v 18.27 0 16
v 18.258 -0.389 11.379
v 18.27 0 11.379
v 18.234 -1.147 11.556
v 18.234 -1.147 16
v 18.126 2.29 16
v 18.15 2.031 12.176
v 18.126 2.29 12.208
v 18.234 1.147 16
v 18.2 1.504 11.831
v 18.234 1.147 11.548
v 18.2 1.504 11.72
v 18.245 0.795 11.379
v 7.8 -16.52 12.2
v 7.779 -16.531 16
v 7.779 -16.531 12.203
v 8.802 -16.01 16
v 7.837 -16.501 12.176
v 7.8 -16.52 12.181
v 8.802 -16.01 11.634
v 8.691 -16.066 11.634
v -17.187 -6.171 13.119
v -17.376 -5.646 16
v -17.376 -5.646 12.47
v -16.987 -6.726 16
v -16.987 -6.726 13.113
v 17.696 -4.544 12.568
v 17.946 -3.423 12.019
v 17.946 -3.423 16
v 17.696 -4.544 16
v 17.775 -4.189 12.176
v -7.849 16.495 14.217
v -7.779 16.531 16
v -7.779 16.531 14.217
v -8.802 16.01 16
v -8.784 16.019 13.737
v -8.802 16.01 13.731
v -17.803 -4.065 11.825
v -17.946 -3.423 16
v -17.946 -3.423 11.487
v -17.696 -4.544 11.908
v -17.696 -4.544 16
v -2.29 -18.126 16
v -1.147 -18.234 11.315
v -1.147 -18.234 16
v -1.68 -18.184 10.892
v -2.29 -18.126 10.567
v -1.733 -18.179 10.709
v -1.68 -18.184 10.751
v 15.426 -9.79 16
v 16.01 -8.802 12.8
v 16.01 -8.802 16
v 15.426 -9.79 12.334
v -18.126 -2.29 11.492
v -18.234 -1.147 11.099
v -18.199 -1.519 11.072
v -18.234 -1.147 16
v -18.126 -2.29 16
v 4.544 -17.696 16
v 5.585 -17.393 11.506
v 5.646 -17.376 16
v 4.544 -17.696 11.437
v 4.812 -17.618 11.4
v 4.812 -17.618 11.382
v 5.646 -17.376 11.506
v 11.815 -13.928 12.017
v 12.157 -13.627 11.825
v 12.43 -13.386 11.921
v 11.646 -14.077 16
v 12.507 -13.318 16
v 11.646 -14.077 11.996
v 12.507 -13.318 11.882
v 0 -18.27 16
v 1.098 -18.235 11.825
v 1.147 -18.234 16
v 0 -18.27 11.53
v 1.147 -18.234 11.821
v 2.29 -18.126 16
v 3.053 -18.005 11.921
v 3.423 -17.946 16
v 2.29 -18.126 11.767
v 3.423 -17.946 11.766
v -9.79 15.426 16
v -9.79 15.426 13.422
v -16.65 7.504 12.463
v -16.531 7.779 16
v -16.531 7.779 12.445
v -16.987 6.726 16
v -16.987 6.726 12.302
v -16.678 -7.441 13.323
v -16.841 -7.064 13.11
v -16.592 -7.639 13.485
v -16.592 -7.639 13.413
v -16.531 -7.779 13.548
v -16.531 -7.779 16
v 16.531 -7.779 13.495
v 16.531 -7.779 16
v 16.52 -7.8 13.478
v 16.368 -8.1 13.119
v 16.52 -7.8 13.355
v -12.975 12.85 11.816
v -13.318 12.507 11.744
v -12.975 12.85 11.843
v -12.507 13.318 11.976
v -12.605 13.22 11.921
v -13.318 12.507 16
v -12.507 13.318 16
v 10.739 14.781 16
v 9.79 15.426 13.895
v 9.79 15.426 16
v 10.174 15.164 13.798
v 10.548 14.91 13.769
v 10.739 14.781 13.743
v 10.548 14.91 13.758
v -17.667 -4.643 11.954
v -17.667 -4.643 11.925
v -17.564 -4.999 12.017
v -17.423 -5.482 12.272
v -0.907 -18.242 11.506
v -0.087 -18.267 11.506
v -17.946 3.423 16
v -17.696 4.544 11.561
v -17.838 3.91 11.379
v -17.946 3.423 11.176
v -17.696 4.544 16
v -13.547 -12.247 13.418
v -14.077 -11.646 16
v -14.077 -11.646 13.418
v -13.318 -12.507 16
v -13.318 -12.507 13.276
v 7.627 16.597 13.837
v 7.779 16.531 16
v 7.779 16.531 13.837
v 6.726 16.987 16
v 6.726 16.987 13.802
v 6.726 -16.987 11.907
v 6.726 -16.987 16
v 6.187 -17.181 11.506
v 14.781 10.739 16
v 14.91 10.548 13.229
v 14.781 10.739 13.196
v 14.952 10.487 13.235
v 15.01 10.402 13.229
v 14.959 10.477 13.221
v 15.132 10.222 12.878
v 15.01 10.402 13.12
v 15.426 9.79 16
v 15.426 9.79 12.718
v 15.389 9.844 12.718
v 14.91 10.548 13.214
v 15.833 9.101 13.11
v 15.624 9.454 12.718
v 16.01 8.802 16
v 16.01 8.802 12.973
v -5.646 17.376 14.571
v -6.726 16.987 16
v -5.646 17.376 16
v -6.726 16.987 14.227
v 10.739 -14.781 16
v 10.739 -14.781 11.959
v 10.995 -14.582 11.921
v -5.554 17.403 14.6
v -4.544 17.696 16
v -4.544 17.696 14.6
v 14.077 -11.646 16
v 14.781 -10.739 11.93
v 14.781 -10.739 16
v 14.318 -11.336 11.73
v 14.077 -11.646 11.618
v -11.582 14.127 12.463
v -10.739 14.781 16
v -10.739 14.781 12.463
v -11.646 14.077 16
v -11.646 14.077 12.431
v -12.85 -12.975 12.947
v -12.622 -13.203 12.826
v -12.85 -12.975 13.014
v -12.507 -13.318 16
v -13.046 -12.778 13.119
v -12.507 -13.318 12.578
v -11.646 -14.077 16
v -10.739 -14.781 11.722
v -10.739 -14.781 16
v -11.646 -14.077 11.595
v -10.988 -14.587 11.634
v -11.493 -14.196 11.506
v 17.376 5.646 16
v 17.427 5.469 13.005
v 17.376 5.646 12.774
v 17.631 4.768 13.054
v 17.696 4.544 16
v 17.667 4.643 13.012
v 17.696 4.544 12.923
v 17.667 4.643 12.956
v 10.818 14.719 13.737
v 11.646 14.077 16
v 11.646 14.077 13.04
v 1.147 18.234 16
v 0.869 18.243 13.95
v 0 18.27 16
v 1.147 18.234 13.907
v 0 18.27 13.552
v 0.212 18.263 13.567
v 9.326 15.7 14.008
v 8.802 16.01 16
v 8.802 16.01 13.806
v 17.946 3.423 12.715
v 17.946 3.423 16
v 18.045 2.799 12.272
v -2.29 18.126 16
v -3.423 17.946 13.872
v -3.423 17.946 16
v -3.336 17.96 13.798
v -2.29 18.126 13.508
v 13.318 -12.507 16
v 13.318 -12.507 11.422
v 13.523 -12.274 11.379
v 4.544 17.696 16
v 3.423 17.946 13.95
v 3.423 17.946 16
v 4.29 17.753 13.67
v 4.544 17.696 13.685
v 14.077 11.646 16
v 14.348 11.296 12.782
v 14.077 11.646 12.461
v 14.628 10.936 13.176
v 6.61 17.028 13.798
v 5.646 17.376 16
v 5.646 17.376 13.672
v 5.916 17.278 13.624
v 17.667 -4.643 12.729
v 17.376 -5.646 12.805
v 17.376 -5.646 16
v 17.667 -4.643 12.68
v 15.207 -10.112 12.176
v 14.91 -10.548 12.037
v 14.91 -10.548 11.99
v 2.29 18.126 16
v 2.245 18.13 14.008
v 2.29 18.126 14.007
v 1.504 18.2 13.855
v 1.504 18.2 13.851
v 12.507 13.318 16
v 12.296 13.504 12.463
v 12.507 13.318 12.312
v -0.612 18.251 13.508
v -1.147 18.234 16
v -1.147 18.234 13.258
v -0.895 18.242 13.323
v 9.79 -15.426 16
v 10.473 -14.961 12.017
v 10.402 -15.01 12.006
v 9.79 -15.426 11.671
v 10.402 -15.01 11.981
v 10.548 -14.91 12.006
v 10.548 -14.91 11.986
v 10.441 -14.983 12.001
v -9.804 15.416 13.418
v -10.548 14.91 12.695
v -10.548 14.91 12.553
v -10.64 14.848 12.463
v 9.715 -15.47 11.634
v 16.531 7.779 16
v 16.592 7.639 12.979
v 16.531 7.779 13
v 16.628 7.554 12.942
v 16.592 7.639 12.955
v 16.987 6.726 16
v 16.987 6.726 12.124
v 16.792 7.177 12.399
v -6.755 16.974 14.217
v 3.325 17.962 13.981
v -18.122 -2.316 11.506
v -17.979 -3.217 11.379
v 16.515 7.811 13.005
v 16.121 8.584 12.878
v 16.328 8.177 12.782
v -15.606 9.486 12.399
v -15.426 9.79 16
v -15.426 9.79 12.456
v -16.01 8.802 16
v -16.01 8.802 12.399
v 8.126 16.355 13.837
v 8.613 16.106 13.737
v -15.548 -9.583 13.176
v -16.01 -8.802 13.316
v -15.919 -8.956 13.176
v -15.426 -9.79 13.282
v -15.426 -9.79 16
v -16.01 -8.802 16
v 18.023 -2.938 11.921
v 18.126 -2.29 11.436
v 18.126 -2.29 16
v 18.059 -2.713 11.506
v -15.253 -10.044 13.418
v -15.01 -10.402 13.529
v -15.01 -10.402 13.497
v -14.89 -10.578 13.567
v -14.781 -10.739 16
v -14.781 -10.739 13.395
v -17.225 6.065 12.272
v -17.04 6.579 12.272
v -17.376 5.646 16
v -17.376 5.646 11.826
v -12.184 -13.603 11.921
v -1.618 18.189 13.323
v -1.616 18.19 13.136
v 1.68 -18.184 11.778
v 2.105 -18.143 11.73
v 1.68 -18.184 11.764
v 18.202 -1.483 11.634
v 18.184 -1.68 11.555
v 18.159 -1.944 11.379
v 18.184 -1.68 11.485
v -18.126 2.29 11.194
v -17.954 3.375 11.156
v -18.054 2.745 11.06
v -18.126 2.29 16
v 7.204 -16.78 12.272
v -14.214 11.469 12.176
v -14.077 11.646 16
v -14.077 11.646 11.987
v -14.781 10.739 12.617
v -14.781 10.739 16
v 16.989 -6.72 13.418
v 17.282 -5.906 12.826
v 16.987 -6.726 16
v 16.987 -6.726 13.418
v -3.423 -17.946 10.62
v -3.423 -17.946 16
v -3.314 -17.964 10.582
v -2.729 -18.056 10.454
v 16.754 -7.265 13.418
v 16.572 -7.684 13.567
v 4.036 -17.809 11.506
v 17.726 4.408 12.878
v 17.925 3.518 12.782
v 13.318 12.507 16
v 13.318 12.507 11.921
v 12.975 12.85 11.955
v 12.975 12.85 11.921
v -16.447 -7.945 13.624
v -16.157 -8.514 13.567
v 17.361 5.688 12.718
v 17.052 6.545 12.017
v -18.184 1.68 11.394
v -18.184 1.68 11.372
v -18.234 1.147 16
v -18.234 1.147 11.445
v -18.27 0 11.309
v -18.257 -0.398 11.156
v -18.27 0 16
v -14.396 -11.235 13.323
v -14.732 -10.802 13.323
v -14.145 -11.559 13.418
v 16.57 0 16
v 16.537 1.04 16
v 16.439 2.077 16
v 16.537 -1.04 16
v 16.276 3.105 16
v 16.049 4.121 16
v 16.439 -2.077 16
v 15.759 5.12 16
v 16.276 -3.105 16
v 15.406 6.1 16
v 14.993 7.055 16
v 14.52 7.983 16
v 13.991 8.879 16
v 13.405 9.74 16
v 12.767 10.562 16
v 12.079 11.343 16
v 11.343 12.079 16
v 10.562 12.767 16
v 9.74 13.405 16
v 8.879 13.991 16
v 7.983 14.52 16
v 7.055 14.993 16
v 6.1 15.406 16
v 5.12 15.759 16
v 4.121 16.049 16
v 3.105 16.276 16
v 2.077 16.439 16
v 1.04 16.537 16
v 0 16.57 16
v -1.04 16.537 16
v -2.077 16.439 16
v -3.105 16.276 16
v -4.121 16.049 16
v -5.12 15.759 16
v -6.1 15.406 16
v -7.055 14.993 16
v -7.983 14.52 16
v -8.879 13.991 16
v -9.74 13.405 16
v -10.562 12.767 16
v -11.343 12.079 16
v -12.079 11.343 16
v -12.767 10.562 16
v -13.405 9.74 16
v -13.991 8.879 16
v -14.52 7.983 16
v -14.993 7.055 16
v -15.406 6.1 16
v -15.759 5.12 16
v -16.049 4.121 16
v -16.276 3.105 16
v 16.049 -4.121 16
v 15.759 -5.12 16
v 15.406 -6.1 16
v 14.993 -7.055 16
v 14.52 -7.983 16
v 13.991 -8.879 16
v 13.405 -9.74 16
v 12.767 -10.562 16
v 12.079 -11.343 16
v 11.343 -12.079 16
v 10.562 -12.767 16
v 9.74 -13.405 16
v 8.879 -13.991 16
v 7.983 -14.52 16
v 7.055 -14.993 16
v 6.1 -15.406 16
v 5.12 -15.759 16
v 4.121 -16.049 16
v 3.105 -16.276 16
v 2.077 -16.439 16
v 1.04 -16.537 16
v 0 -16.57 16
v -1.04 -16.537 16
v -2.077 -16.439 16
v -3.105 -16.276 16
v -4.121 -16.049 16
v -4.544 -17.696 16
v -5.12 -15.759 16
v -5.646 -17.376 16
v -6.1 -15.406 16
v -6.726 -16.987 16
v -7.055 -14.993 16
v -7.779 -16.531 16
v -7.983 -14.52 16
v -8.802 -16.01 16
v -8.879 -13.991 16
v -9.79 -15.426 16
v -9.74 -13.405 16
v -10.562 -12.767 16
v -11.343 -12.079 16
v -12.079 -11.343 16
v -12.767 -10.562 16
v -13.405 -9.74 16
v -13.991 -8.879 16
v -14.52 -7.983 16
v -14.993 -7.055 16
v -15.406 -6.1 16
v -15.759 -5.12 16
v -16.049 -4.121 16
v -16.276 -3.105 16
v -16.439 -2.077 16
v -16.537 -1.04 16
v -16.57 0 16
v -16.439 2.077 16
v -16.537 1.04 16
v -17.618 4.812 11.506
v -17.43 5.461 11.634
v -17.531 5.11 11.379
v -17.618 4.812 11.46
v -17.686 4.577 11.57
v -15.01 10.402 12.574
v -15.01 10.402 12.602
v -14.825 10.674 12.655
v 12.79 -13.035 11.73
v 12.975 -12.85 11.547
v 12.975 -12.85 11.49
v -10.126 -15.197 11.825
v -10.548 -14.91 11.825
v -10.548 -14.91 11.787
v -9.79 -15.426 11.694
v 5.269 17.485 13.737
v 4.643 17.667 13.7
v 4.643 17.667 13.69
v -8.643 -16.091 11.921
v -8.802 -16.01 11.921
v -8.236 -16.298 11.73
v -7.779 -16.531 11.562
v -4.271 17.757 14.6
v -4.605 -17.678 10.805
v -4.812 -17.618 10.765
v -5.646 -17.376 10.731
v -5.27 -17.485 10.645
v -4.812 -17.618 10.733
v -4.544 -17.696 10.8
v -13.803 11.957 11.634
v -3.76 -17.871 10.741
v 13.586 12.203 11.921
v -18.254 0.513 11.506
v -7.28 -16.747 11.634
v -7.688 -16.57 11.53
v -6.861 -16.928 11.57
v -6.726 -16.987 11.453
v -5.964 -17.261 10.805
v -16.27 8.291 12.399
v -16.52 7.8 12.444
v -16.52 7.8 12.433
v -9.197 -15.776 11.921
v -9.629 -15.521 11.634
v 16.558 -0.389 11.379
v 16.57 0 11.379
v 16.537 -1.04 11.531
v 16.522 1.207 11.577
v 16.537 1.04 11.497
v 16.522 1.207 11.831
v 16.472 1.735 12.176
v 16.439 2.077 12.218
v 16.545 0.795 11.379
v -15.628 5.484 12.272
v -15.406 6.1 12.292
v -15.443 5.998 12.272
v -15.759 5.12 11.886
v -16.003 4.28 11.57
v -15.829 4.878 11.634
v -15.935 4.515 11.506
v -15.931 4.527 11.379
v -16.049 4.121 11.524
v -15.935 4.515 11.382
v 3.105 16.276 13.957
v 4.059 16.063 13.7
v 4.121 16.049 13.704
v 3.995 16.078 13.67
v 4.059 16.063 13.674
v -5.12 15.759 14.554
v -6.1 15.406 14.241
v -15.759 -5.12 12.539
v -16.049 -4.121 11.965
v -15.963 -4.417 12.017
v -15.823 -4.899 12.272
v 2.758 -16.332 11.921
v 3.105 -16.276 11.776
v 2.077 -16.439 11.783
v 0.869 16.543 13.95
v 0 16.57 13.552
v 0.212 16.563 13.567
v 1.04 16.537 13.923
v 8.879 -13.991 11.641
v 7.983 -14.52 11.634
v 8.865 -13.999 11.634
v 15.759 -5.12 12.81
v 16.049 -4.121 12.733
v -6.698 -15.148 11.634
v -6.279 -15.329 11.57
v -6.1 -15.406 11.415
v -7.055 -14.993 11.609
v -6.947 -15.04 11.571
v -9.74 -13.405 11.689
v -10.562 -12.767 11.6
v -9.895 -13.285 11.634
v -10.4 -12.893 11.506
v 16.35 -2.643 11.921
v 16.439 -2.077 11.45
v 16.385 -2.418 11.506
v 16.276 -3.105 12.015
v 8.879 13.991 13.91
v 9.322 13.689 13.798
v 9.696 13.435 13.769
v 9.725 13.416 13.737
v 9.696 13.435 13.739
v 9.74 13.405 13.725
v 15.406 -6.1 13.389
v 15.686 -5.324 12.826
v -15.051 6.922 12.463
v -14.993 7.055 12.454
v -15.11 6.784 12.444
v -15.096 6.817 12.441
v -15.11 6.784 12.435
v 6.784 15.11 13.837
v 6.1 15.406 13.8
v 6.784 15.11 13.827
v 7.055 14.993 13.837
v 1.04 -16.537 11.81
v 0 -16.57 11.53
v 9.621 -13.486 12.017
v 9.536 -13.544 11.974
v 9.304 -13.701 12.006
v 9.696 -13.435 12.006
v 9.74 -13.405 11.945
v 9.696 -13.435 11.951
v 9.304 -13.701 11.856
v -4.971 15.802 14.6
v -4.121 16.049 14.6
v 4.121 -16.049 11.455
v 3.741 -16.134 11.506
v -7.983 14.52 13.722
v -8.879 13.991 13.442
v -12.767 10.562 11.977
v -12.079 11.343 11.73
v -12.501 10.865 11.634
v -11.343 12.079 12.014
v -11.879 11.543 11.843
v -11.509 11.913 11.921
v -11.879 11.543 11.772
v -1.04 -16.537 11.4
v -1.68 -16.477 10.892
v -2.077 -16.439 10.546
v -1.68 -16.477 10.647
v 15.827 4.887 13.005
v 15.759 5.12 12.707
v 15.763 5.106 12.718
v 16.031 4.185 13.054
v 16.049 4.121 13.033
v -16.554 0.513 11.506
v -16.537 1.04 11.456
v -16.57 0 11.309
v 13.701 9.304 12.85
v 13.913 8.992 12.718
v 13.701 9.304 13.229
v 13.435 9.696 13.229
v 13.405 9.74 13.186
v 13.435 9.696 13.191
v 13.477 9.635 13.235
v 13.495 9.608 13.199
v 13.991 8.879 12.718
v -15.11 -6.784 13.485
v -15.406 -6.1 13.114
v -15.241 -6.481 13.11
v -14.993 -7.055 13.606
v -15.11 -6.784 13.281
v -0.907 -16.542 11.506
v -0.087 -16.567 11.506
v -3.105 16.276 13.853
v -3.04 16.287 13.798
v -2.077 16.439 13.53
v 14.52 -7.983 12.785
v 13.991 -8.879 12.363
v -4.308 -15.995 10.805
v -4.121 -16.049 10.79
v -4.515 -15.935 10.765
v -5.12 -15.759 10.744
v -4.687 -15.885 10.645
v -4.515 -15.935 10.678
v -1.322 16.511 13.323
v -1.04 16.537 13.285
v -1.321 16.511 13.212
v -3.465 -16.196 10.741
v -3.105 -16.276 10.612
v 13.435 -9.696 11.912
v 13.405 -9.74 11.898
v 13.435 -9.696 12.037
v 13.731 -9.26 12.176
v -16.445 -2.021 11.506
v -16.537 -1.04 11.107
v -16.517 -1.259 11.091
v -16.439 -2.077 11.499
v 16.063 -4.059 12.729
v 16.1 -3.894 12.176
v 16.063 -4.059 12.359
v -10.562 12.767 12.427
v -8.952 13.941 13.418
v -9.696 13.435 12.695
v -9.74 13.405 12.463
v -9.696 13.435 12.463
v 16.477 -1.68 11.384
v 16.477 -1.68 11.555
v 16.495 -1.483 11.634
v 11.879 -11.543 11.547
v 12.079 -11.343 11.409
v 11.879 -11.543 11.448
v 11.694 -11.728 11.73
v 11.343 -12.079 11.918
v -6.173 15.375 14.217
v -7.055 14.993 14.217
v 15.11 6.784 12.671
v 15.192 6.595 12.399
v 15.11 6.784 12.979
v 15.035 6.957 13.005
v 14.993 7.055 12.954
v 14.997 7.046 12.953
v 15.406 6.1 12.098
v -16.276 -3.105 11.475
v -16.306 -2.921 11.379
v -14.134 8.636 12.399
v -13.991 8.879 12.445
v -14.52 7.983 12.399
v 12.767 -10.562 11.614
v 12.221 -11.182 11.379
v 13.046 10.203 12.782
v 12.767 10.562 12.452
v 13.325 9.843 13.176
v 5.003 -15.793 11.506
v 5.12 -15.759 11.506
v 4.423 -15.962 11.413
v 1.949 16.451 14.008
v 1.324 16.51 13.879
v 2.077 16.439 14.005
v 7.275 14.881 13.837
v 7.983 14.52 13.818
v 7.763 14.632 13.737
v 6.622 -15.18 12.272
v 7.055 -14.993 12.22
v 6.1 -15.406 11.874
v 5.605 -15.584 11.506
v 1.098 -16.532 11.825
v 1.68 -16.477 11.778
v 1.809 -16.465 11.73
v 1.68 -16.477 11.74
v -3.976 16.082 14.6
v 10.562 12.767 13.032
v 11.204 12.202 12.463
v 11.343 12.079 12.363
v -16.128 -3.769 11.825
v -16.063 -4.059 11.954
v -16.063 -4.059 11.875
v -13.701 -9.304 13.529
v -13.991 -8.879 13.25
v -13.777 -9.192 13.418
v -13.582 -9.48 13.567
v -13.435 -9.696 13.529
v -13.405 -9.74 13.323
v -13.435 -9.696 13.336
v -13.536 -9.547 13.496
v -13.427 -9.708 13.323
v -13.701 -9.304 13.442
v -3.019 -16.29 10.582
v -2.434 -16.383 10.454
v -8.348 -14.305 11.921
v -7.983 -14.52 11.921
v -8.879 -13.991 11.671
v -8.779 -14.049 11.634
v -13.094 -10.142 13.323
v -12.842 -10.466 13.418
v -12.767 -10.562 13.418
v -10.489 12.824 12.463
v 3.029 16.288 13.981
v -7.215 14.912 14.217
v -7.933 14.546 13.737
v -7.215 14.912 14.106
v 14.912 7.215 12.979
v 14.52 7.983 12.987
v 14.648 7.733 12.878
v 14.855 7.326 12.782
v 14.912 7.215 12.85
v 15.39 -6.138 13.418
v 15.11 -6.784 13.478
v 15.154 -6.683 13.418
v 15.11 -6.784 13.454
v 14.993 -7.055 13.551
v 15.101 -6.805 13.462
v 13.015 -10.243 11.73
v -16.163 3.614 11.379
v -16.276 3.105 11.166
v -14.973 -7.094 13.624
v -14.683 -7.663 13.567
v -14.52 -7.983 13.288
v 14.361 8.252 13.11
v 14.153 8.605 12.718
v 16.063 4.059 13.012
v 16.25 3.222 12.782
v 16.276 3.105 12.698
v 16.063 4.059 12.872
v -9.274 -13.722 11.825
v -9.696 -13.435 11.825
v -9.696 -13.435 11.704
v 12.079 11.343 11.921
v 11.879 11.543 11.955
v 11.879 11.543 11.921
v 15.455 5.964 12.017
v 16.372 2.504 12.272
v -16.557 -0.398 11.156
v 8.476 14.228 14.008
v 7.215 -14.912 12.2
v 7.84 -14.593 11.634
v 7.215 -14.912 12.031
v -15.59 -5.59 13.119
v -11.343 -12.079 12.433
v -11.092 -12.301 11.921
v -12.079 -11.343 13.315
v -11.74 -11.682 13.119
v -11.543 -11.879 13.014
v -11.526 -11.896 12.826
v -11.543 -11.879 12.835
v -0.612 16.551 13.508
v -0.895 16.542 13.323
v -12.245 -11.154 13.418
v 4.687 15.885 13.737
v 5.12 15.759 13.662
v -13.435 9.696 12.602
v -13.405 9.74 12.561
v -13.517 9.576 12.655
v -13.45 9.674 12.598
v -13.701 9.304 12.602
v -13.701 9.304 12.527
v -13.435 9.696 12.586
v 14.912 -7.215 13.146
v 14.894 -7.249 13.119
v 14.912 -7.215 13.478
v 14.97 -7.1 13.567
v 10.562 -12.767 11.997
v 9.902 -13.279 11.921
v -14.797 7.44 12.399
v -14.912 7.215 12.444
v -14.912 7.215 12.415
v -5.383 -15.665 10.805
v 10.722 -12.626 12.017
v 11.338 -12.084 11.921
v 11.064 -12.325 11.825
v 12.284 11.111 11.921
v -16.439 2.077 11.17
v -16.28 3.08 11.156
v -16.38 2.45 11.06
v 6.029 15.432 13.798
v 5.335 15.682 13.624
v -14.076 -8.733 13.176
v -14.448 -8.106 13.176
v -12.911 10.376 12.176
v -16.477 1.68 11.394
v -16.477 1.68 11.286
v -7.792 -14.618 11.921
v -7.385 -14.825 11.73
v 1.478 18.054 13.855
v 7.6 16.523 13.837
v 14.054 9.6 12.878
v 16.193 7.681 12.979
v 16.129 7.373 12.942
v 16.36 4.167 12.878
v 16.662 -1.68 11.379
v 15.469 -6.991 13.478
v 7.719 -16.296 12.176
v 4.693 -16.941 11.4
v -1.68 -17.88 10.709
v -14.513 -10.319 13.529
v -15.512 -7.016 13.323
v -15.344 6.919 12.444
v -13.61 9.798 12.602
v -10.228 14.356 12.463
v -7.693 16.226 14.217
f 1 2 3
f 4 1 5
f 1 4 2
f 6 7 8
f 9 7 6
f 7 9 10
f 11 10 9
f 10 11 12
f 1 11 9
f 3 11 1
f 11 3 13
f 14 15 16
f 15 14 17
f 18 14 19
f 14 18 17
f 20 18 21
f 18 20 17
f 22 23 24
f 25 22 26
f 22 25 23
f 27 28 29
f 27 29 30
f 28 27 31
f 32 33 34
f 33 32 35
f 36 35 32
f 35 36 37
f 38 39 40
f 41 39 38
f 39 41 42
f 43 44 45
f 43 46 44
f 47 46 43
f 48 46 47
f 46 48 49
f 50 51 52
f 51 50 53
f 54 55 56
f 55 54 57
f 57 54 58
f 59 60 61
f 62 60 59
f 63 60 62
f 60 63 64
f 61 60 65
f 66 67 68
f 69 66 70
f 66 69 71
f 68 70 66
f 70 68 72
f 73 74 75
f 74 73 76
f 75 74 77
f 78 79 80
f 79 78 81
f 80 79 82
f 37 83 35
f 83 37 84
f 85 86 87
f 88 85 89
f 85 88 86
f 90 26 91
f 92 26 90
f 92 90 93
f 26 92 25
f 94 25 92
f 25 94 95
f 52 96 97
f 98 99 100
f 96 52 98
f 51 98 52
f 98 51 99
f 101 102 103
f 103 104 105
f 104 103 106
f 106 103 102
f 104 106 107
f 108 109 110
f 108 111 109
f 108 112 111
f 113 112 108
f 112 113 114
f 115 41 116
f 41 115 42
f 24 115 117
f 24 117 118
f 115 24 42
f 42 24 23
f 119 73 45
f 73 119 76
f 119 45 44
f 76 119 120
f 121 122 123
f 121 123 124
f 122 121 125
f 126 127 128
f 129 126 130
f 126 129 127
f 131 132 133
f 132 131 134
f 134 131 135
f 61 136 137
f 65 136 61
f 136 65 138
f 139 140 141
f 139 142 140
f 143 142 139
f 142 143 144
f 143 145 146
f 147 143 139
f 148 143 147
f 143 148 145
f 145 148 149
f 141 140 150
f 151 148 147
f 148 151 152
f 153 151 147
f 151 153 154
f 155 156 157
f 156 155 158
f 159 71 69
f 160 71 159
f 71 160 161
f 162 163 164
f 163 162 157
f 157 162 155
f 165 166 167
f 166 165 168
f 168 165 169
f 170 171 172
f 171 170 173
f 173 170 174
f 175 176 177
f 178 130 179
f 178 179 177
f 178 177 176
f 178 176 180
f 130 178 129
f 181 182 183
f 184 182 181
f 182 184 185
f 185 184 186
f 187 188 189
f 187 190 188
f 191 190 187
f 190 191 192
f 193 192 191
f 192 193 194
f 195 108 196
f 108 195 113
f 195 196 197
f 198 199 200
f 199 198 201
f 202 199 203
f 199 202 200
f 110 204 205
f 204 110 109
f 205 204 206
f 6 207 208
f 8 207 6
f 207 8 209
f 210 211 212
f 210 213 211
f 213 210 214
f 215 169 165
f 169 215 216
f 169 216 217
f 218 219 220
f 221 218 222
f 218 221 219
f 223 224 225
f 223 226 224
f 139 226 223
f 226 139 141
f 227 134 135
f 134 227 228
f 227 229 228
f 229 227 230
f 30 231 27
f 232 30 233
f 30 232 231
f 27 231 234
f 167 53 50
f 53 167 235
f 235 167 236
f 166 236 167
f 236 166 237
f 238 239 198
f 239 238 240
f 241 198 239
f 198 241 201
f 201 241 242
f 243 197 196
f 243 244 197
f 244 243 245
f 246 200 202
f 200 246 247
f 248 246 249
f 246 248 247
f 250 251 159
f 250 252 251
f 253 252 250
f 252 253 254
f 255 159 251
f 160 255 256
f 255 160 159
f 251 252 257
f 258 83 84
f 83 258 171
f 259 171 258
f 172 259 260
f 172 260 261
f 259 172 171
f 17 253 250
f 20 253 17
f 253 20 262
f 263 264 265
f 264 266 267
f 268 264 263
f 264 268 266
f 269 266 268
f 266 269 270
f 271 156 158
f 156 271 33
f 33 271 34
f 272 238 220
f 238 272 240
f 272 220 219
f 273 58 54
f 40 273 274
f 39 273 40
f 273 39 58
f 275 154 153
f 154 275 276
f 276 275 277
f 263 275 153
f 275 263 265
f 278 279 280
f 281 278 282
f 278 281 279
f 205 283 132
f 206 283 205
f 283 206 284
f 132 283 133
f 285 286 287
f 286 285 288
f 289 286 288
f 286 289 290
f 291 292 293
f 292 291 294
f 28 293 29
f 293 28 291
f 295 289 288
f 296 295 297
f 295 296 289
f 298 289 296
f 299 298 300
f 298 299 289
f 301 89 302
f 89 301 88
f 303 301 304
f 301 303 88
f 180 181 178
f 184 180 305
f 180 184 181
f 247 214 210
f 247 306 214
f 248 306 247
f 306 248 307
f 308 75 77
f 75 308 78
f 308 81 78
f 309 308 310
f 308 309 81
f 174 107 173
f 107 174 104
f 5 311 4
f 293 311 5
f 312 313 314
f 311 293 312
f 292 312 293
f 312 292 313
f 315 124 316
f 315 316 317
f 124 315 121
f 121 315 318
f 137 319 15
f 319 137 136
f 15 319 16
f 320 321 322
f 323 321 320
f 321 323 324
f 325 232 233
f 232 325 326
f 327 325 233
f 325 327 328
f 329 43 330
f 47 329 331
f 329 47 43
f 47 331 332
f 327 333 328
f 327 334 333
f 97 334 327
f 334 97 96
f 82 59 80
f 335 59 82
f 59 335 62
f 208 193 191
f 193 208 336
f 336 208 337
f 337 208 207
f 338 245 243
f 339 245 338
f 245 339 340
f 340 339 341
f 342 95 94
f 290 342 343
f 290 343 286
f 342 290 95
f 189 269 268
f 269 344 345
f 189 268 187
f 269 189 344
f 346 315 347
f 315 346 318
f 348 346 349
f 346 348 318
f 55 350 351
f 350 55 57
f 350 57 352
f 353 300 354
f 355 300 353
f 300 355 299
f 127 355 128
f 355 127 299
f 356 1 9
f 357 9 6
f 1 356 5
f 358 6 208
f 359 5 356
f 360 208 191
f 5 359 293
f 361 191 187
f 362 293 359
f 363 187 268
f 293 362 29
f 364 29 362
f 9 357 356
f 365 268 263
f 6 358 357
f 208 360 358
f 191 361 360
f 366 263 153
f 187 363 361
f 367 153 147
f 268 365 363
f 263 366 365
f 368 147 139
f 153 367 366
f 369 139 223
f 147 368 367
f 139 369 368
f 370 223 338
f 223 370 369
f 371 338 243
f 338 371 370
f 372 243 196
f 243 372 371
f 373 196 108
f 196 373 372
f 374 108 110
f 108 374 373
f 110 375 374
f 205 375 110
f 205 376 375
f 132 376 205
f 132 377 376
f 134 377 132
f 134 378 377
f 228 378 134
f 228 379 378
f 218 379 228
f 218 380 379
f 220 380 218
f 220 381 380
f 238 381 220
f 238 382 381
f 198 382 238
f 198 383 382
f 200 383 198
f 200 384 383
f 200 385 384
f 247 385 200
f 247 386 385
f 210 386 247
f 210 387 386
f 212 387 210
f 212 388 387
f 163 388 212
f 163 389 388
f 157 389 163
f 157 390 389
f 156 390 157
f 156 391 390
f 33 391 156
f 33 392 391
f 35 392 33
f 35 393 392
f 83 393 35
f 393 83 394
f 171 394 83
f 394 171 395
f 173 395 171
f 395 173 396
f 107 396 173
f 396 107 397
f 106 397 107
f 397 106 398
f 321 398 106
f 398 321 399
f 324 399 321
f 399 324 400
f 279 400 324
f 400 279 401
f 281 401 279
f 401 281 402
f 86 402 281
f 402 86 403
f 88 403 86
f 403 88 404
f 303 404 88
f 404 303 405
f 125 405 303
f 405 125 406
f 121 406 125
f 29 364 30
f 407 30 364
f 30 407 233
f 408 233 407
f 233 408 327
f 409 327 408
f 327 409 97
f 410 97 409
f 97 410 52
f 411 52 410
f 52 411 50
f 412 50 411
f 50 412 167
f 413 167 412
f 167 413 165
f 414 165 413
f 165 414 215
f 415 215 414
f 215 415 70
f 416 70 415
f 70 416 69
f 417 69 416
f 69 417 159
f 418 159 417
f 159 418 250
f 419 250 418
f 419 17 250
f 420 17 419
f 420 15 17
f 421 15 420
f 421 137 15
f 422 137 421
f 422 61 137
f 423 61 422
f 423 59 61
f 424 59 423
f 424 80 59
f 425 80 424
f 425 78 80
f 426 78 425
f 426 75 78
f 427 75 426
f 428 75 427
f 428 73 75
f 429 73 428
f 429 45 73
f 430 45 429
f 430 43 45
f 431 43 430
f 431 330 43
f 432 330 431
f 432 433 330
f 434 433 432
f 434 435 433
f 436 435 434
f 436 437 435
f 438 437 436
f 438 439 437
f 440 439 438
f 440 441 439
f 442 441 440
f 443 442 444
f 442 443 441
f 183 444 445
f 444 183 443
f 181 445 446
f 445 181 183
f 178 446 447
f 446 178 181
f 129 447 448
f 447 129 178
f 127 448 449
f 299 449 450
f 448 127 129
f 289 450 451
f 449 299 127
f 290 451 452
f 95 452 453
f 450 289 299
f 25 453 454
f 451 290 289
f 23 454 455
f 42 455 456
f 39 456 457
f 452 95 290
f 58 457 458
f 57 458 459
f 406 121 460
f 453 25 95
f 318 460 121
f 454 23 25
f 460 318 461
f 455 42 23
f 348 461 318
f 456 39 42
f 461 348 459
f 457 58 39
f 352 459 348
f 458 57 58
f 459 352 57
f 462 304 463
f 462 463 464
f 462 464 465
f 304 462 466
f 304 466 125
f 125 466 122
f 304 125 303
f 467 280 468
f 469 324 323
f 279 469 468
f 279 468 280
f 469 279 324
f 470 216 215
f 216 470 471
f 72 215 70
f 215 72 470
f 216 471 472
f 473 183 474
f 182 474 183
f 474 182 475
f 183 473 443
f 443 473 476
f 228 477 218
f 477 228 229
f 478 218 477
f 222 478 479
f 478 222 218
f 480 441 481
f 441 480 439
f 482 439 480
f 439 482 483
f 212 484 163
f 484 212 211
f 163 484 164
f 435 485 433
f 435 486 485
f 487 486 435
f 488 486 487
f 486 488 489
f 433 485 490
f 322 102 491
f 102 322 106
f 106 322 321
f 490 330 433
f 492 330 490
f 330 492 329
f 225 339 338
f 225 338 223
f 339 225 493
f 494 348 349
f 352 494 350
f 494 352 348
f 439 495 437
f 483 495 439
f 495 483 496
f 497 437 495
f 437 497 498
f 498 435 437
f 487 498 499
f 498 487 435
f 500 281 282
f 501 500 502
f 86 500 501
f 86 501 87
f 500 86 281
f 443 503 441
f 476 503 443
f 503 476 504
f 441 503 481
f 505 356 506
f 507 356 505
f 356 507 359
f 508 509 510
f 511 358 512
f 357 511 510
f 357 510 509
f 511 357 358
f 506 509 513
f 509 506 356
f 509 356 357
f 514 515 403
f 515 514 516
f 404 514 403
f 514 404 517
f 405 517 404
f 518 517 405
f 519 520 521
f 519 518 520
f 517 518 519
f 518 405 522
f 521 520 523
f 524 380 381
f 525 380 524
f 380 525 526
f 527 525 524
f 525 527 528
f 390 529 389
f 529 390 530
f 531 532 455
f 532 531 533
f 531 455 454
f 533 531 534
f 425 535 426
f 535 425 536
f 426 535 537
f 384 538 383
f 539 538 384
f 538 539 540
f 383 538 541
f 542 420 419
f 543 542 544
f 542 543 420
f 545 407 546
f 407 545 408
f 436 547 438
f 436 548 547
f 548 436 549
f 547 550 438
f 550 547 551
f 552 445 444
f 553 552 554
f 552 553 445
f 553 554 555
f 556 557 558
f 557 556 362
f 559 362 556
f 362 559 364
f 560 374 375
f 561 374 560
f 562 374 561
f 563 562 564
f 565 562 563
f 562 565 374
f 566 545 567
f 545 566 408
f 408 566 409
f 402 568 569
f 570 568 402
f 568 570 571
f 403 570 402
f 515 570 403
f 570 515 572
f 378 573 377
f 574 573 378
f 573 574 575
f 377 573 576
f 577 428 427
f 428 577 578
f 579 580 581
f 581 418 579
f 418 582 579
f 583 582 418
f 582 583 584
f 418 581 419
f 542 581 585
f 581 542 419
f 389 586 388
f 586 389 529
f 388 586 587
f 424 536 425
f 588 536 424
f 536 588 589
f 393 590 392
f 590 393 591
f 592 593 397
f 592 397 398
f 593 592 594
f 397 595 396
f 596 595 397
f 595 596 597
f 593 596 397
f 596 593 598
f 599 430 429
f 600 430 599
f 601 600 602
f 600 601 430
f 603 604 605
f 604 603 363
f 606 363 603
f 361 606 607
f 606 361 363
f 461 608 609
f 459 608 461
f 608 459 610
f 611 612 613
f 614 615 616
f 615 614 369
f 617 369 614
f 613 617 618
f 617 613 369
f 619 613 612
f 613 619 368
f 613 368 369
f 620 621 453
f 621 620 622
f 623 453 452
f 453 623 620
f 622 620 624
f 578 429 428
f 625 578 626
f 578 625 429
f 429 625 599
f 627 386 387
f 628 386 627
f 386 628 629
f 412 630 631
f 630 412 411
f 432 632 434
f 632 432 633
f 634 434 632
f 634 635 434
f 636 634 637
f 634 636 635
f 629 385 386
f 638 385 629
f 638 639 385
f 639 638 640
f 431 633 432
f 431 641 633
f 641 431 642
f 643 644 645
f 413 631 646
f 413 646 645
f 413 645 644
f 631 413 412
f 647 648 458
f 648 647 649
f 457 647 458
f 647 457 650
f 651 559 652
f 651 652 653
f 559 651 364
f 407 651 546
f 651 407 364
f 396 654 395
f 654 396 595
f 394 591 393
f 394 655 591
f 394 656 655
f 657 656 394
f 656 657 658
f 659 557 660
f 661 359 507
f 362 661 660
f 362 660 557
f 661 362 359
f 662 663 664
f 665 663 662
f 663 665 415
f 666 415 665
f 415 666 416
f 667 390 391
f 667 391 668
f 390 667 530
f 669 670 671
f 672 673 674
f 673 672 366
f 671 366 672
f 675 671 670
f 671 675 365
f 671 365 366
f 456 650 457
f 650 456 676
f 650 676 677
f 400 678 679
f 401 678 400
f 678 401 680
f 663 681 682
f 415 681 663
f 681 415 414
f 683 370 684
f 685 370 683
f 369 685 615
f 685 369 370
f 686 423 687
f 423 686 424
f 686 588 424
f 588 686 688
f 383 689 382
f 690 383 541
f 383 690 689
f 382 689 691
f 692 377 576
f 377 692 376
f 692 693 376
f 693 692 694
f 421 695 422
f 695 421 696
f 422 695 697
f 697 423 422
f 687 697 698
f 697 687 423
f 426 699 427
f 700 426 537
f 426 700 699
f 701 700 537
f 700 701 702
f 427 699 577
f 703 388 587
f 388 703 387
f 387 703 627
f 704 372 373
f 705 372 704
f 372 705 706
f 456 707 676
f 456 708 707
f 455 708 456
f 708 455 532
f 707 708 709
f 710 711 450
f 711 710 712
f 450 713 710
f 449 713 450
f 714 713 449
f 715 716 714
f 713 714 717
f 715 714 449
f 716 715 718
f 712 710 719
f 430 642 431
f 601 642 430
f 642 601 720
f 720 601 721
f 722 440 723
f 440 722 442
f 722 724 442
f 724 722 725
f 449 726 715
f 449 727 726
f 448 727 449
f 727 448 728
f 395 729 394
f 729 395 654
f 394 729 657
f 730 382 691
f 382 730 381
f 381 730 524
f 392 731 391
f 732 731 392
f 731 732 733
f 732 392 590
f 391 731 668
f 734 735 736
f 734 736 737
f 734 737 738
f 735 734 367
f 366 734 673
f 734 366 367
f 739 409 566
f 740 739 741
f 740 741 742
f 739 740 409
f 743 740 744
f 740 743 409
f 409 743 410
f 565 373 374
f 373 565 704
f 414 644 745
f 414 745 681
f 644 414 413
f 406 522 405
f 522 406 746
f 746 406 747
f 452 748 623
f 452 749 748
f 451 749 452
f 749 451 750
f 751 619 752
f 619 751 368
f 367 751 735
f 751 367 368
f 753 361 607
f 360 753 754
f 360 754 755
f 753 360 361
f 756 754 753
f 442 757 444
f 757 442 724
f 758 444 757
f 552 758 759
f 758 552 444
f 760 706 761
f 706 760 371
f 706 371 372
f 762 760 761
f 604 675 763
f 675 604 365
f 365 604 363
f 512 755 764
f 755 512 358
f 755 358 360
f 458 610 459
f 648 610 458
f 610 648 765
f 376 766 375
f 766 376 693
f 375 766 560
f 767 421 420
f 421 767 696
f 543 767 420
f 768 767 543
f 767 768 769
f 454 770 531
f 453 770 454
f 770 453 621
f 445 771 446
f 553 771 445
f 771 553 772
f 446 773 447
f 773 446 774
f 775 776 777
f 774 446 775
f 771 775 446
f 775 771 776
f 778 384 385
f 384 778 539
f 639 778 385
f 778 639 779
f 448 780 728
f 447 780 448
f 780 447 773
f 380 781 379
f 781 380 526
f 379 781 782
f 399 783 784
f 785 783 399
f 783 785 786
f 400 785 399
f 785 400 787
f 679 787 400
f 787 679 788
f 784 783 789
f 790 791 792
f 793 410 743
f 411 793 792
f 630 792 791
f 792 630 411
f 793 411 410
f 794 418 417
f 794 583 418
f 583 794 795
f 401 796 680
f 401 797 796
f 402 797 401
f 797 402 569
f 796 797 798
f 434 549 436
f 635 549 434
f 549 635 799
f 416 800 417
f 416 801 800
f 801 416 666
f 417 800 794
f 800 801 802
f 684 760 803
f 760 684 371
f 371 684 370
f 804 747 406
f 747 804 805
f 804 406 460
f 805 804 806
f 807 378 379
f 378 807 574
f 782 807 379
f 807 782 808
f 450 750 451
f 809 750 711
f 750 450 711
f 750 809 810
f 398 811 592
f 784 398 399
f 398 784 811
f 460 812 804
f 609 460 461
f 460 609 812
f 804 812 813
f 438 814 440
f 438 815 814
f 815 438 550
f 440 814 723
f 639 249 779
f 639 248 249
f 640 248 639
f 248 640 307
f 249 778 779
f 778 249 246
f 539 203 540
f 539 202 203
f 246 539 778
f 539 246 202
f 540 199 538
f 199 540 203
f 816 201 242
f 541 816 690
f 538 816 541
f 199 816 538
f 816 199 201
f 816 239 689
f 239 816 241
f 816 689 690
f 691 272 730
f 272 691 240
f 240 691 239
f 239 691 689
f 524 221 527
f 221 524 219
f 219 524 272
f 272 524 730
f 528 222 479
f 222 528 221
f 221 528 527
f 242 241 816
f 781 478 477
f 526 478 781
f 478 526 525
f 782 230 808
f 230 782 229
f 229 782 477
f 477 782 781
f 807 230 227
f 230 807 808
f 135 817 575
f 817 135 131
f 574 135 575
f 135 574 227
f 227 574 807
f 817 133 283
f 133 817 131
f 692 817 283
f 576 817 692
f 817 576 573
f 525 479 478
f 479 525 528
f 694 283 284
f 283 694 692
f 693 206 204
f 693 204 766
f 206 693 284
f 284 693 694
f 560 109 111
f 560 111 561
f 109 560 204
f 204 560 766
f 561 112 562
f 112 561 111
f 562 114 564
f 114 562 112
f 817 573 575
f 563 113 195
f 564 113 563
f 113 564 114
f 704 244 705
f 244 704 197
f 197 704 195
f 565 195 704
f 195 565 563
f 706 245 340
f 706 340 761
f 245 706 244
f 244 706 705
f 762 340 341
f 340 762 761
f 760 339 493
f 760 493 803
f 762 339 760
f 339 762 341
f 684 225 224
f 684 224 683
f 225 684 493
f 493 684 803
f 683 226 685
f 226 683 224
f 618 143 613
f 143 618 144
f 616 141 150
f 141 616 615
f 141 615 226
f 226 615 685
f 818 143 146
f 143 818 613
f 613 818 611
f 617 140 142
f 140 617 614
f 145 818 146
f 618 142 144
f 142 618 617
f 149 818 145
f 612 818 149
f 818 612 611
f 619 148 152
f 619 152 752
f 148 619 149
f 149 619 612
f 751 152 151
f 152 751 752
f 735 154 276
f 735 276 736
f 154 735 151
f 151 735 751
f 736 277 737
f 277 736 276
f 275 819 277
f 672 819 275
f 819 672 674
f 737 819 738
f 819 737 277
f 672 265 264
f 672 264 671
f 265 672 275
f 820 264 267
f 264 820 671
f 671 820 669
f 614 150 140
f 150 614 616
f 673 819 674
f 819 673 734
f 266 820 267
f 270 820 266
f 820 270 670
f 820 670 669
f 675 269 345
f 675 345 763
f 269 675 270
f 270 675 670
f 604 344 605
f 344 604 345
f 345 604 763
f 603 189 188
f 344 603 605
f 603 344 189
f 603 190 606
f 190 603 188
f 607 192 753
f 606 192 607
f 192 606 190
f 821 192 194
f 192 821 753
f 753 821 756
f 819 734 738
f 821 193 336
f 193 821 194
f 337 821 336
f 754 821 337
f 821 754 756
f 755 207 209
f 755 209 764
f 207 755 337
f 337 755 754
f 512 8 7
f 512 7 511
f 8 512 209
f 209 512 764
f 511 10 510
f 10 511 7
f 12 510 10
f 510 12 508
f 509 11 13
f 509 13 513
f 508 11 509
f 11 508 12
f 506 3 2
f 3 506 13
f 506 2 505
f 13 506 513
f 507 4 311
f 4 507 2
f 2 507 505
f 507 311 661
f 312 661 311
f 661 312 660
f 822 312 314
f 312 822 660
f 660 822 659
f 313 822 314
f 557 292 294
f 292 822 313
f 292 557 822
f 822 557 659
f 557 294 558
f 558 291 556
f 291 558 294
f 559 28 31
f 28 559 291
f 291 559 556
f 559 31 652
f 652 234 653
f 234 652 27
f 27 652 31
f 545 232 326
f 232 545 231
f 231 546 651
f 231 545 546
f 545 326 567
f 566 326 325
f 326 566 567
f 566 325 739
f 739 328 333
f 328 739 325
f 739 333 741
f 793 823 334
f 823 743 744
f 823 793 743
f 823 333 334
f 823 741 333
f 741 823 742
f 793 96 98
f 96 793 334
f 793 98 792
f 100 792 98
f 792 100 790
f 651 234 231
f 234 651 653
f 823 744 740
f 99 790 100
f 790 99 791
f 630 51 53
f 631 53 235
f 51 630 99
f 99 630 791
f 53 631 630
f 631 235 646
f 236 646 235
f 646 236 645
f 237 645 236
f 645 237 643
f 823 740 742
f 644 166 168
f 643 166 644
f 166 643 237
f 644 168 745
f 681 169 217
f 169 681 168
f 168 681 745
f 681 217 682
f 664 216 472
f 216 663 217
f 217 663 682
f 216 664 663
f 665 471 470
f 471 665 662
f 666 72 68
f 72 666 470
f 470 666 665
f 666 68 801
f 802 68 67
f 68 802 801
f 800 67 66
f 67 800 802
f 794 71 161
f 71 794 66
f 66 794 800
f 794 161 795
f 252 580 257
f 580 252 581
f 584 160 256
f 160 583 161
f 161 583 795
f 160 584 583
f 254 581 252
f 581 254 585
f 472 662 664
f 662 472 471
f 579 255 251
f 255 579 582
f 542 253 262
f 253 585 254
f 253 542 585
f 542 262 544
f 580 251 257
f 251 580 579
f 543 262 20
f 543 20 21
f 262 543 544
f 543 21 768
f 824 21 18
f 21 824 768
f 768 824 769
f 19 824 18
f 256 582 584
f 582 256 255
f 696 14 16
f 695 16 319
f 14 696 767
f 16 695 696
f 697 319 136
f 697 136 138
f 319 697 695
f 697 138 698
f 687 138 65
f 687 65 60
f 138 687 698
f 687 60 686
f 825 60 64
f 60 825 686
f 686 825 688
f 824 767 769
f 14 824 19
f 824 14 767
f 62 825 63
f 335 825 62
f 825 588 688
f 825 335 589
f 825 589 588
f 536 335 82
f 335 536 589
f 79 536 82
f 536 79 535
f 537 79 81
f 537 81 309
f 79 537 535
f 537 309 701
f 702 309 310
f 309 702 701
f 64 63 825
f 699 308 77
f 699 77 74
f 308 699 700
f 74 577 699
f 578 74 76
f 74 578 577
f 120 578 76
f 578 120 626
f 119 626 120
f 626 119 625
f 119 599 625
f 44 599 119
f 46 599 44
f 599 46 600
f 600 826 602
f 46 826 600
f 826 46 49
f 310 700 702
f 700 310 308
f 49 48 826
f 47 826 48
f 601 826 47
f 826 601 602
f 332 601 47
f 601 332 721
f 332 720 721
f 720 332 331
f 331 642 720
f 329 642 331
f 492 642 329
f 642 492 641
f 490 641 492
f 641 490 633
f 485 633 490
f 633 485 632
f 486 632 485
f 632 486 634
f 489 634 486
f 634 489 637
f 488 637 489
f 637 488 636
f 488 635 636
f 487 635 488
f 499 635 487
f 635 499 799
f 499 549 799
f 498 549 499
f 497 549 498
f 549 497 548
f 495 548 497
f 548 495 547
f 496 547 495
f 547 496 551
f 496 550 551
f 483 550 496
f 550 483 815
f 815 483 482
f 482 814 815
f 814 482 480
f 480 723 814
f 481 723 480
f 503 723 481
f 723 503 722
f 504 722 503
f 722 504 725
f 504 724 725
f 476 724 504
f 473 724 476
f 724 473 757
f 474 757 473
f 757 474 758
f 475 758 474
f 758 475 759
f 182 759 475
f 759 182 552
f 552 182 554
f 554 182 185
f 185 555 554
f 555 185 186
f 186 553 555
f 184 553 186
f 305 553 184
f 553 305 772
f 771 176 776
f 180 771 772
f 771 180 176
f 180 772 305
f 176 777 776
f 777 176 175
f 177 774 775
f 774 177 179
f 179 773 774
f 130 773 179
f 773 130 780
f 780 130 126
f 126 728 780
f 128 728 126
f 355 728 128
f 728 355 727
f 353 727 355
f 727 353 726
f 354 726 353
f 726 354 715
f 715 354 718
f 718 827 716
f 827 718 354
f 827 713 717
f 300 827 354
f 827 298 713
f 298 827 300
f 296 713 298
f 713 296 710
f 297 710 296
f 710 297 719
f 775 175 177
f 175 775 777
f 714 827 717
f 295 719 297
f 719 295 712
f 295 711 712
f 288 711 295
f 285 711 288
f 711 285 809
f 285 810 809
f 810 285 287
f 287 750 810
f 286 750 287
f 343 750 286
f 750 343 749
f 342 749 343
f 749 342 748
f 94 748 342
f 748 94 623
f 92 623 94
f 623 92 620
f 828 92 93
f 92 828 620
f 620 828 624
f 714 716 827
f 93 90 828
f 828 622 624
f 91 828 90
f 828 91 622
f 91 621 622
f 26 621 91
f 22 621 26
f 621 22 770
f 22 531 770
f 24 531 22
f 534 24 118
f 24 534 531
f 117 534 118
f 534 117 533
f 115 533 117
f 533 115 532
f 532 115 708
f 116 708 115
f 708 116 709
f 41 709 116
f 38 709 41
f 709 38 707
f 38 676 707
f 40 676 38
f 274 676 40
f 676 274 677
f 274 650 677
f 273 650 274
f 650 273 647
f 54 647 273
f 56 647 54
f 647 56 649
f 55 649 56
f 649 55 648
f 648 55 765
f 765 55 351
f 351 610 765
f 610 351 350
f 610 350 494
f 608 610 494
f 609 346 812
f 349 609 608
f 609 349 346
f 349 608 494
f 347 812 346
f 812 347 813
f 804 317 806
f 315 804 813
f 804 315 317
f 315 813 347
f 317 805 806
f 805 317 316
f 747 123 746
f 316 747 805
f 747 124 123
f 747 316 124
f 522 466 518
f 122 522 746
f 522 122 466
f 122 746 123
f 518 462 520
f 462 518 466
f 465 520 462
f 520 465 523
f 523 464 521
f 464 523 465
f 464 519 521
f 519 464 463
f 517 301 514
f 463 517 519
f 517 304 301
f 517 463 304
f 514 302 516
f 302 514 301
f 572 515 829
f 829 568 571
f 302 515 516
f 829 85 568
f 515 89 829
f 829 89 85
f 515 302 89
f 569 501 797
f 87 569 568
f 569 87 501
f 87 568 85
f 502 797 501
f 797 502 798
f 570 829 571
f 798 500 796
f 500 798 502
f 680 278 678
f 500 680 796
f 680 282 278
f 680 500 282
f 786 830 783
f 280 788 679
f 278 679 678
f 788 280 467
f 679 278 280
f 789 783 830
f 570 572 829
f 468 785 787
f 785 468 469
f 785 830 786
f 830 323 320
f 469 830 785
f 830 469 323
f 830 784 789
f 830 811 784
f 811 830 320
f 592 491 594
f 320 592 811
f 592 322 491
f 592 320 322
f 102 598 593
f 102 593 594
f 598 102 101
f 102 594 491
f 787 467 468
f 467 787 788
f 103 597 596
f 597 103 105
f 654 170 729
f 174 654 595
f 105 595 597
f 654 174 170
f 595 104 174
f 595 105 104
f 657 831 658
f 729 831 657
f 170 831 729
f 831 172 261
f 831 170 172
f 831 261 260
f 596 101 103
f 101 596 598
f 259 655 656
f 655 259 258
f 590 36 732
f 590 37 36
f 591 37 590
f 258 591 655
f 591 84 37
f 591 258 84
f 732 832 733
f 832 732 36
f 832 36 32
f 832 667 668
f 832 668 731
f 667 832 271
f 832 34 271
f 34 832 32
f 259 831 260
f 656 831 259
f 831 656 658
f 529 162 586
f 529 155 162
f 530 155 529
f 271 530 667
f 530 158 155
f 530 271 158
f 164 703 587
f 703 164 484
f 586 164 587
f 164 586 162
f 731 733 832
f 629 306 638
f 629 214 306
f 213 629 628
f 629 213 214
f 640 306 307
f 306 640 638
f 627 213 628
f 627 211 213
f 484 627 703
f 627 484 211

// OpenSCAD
// units in mm

Pi = 3.14159265359; // 4 * atan(1, 1);
camInnerRadius = 17.5;
aishaInnerRadius = 16.57;

// 100 wide
module mountains() {
    polygon(
        points =
        [
          [
            0.09614067197569988,
            20.110599670231725
          ],
          [
            100,
            19.587499484187425
          ],
          [
            99.90533545957403,
            1.5081034540661937
          ],
          [
            98.47381483915227,
            0.9475693215701695
          ],
          [
            97.68272623819821,
            0
          ],
          [
            96.43958652378834,
            0
          ],
          [
            95.38480172251627,
            0.45204998205009334
          ],
          [
            94.25467488064743,
            0.45204998205009334
          ],
          [
            93.38824423909658,
            1.0197574847749367
          ],
          [
            92.40880110171301,
            1.396354682797286
          ],
          [
            91.42935758762113,
            2.523945738983393
          ],
          [
            90.44991445023757,
            2.523945738983393
          ],
          [
            89.3197876083687,
            3.164349882035504
          ],
          [
            87.73761002975233,
            3.50338736953368
          ],
          [
            87.2102176291163,
            2.8629832264815693
          ],
          [
            86.3814578195097,
            2.2977742190829287
          ],
          [
            85.06297681791963,
            2.5992874028718767
          ],
          [
            83.93284997605079,
            2.5992874028718767
          ],
          [
            83.06641933449994,
            2.523945738983393
          ],
          [
            82.23765952489335,
            2.749970730648844
          ],
          [
            81.78560878814581,
            2.749970730648844
          ],
          [
            81.25821638750979,
            3.50338736953368
          ],
          [
            80.95684935524753,
            3.8047540326217812
          ],
          [
            80.35411491401472,
            3.5787290334221638
          ],
          [
            79.78905168143446,
            3.8047540326217812
          ],
          [
            79.3370009446869,
            4.0684498562314735
          ],
          [
            78.80960854405087,
            4.181462352064199
          ],
          [
            77.90550707055579,
            3.8047540326217812
          ],
          [
            76.81305106063118,
            3.654070697310648
          ],
          [
            76.0596332916214,
            4.0684498562314735
          ],
          [
            75.00484811364102,
            4.181462352064199
          ],
          [
            74.3267720085197,
            3.654070697310648
          ],
          [
            73.57335423950992,
            3.8047540326217812
          ],
          [
            72.85760730244436,
            3.2773623778682293
          ],
          [
            71.91583499700505,
            3.0513373862027784
          ],
          [
            71.50145509220175,
            2.749970730648844
          ],
          [
            70.89872065096891,
            1.7492889967059408
          ],
          [
            70.10763205001489,
            1.7603048445322376
          ],
          [
            69.76859380910007,
            1.508103593448272
          ],
          [
            69.16585974457556,
            1.1524215351538551
          ],
          [
            68.63846696723121,
            1.2196492145094544
          ],
          [
            68.22408743913624,
            1.6822396510687658
          ],
          [
            67.6213529979034,
            1.6822396510687658
          ],
          [
            67.16930226115586,
            1.396354682797286
          ],
          [
            66.49122615603454,
            1.2196492145094544
          ],
          [
            66.26520078766079,
            1.508103593448272
          ],
          [
            65.81315005091325,
            1.508103593448272
          ],
          [
            65.47411218670675,
            1.396354682797286
          ],
          [
            64.72069404098863,
            1.396354682797286
          ],
          [
            64.11795997646414,
            1.7492889967059408
          ],
          [
            63.477554703287055,
            2.0958836260333684
          ],
          [
            62.98783313459527,
            3.164349882035504
          ],
          [
            62.23441536558547,
            3.654070697310648
          ],
          [
            61.707022588241145,
            3.50338736953368
          ],
          [
            61.14195935566088,
            3.2773623778682293
          ],
          [
            60.689908618913336,
            3.2773623778682293
          ],
          [
            60.20018705022155,
            3.50338736953368
          ],
          [
            59.78580714541825,
            3.164349882035504
          ],
          [
            59.258414744782215,
            3.164349882035504
          ],
          [
            58.88170567192317,
            3.3903748737009547
          ],
          [
            58.3166424393429,
            3.654070697310648
          ],
          [
            57.86459170259537,
            3.50338736953368
          ],
          [
            57.48788262973631,
            3.5787290334221638
          ],
          [
            56.696793652073964,
            4.482829007618134
          ],
          [
            56.09405958754945,
            4.6711831673393425
          ],
          [
            55.3783126504839,
            4.482829007618134
          ],
          [
            54.66256571341833,
            4.558170671506617
          ],
          [
            54.28585664055928,
            4.746524831227827
          ],
          [
            53.7961350718675,
            4.897208159004793
          ],
          [
            52.96737526226091,
            4.59584150345086
          ],
          [
            52.13861582936262,
            3.654070697310648
          ],
          [
            51.46053972424131,
            3.654070697310648
          ],
          [
            50.48109621014943,
            3.2773623778682293
          ],
          [
            49.501653072765855,
            3.3903748737009547
          ],
          [
            48.71056447181183,
            3.164349882035504
          ],
          [
            47.88180466220522,
            3.654070697310648
          ],
          [
            47.09071606125119,
            3.8047540326217812
          ],
          [
            46.41263995612988,
            3.654070697310648
          ],
          [
            45.885247555493855,
            3.654070697310648
          ],
          [
            44.98114608199878,
            2.749970730648844
          ],
          [
            44.2653987682249,
            2.8629832264815693
          ],
          [
            43.47431016727087,
            3.50338736953368
          ],
          [
            42.49486702988729,
            3.50338736953368
          ],
          [
            41.7414492608775,
            3.0513373862027784
          ],
          [
            41.06337315575619,
            3.164349882035504
          ],
          [
            40.196942514205354,
            3.0513373862027784
          ],
          [
            39.820233441346296,
            3.2773623778682293
          ],
          [
            39.51886640908403,
            3.164349882035504
          ],
          [
            39.104486504280736,
            3.3903748737009547
          ],
          [
            38.84079030396274,
            3.654070697310648
          ],
          [
            38.087372534952934,
            3.8047540326217812
          ],
          [
            37.07025818891681,
            3.3903748737009547
          ],
          [
            35.67643514672994,
            2.8629832264815693
          ],
          [
            33.75521970390706,
            1.7492889967059408
          ],
          [
            33.227827303271035,
            1.2196492145094544
          ],
          [
            32.85111823041198,
            1.396354682797286
          ],
          [
            32.3613966617202,
            1.396354682797286
          ],
          [
            31.64564972465464,
            2.0958836260333684
          ],
          [
            30.44018084218899,
            2.2225790834294585
          ],
          [
            30.025801314094004,
            2.8629832264815693
          ],
          [
            28.971016136113644,
            3.164349882035504
          ],
          [
            28.78266159968411,
            3.654070697310648
          ],
          [
            28.142256326507038,
            3.8047540326217812
          ],
          [
            27.61486392587102,
            3.50338736953368
          ],
          [
            26.710762452375942,
            3.8047540326217812
          ],
          [
            25.73131931499237,
            3.8047540326217812
          ],
          [
            25.128584873759547,
            3.3903748737009547
          ],
          [
            24.563521641179282,
            2.8629832264815693
          ],
          [
            23.923116368002205,
            2.749970730648844
          ],
          [
            23.320381926769382,
            2.147237419540975
          ],
          [
            22.566964157759593,
            2.0342249237082495
          ],
          [
            22.11491342101205,
            1.8257929865798976
          ],
          [
            21.512179356487536,
            1.8835415959312825
          ],
          [
            21.32382482005801,
            2.2225790834294585
          ],
          [
            20.570407051048218,
            3.0513373862027784
          ],
          [
            20.005343441759635,
            2.5992874028718767
          ],
          [
            19.666305577553132,
            1.9588832598197659
          ],
          [
            19.289596504694074,
            1.8835415959312825
          ],
          [
            18.950558263779264,
            2.147237419540975
          ],
          [
            18.57384956762853,
            2.0342249237082495
          ],
          [
            18.084127998936747,
            1.7603048445322376
          ],
          [
            17.745089758021926,
            2.2225790834294585
          ],
          [
            17.368381061871187,
            2.2225790834294585
          ],
          [
            16.991671989012133,
            2.0342249237082495
          ],
          [
            16.72797578869412,
            1.6126808704957918
          ],
          [
            16.125241347461298,
            1.6822396510687658
          ],
          [
            15.748532651310562,
            2.147237419540975
          ],
          [
            14.769089137218675,
            3.164349882035504
          ],
          [
            13.940329704320398,
            3.164349882035504
          ],
          [
            13.111569894713796,
            2.523945738983393
          ],
          [
            11.529392316097402,
            1.0197574847749367
          ],
          [
            10.738303715143369,
            0.9475693215701695
          ],
          [
            9.909543905536774,
            0.6992122809419509
          ],
          [
            9.231467800415462,
            1.0197574847749367
          ],
          [
            8.779417176680413,
            0.9014351081267604
          ],
          [
            8.176682886130918,
            0.9014351081267604
          ],
          [
            7.265044119567933,
            0.9475693215701695
          ],
          [
            6.6547888097499355,
            1.1524215351538551
          ],
          [
            6.094013723311549,
            1.0197574847749367
          ],
          [
            5.11122304278892,
            1.0985191177439775
          ],
          [
            4.294800505985724,
            0.7307649139613812
          ],
          [
            3.3912498177245007,
            0.6992122809419509
          ],
          [
            2.705698614078832,
            0.9014351081267604
          ],
          [
            2.107275599562023,
            0.7674563683154871
          ],
          [
            1.5637706683576404,
            1.2196492145094544
          ],
          [
            0.8828208814922941,
            1.2901044478702055
          ],
          [
            0.6490450408126531,
            1.508103593448272
          ],
          [
            0,
            1.7492880926059742
          ]
        ]
        ,
        convexity = 10
    );
}

module mountainRing() {
    H = 8;
    R = camInnerRadius + 1.7;
    L = 100;
    step = 10;

    cubeSide = R * tan((1 / 2) * step) * 2;
    polySurfaceLen = cubeSide * (360 / step);

    scale([1, 1, 0.7]) {
        rotate(-90, [1, 0, 0]) {
            for (i = [0:step:360 - 1]) {
                rotate([0, i, 0]) {
                    translate([0, 0, R - H]) {
                        color([i / 360, 0, 0])
                        intersection() {
                            translate([polySurfaceLen - cubeSide * ((1 / 2) + (i / step)), 0, 0]) {
                                linear_extrude(height = H * 2, convexity = 4) {
                                    scale(.01 * polySurfaceLen) {
                                        translate([-100, 0, 0]) {
                                            mountains();
                                        }
                                    }
                                }
                            }

                            translate([0, 0, H/2])
                                cube([cubeSide, 100, H], center = true);  // window
                        }
                    }
                }
            }
        }
    }
}

// // cameron's ring
// intersection() {
//     difference() {
//         cylinder(h = 6, r1 = camInnerRadius + 1.7, r2 = camInnerRadius + 1.5, $fn = 100);
//         translate([0, 0, -1]) {
//             cylinder(h = 8, r1 = camInnerRadius, r2 = camInnerRadius, $fn = 100);
//         }
//     }
//
//     translate([0, 0, 6]) {
//         mountainRing();
//     }
// }
//
// aisha's ring
difference() {
    translate([0, 0, 10]) {
        difference() {
            cylinder(h = 6, r1 = aishaInnerRadius + 1.7, r2 = aishaInnerRadius + 1.7, $fn = 100);
            translate([0, 0, -1]) {
                cylinder(h = 8, r1 = aishaInnerRadius, r2 = aishaInnerRadius, $fn = 100);
            }
        }
    }

    translate([0, 0, 14.6]) {
        mountainRing();
    }
}
